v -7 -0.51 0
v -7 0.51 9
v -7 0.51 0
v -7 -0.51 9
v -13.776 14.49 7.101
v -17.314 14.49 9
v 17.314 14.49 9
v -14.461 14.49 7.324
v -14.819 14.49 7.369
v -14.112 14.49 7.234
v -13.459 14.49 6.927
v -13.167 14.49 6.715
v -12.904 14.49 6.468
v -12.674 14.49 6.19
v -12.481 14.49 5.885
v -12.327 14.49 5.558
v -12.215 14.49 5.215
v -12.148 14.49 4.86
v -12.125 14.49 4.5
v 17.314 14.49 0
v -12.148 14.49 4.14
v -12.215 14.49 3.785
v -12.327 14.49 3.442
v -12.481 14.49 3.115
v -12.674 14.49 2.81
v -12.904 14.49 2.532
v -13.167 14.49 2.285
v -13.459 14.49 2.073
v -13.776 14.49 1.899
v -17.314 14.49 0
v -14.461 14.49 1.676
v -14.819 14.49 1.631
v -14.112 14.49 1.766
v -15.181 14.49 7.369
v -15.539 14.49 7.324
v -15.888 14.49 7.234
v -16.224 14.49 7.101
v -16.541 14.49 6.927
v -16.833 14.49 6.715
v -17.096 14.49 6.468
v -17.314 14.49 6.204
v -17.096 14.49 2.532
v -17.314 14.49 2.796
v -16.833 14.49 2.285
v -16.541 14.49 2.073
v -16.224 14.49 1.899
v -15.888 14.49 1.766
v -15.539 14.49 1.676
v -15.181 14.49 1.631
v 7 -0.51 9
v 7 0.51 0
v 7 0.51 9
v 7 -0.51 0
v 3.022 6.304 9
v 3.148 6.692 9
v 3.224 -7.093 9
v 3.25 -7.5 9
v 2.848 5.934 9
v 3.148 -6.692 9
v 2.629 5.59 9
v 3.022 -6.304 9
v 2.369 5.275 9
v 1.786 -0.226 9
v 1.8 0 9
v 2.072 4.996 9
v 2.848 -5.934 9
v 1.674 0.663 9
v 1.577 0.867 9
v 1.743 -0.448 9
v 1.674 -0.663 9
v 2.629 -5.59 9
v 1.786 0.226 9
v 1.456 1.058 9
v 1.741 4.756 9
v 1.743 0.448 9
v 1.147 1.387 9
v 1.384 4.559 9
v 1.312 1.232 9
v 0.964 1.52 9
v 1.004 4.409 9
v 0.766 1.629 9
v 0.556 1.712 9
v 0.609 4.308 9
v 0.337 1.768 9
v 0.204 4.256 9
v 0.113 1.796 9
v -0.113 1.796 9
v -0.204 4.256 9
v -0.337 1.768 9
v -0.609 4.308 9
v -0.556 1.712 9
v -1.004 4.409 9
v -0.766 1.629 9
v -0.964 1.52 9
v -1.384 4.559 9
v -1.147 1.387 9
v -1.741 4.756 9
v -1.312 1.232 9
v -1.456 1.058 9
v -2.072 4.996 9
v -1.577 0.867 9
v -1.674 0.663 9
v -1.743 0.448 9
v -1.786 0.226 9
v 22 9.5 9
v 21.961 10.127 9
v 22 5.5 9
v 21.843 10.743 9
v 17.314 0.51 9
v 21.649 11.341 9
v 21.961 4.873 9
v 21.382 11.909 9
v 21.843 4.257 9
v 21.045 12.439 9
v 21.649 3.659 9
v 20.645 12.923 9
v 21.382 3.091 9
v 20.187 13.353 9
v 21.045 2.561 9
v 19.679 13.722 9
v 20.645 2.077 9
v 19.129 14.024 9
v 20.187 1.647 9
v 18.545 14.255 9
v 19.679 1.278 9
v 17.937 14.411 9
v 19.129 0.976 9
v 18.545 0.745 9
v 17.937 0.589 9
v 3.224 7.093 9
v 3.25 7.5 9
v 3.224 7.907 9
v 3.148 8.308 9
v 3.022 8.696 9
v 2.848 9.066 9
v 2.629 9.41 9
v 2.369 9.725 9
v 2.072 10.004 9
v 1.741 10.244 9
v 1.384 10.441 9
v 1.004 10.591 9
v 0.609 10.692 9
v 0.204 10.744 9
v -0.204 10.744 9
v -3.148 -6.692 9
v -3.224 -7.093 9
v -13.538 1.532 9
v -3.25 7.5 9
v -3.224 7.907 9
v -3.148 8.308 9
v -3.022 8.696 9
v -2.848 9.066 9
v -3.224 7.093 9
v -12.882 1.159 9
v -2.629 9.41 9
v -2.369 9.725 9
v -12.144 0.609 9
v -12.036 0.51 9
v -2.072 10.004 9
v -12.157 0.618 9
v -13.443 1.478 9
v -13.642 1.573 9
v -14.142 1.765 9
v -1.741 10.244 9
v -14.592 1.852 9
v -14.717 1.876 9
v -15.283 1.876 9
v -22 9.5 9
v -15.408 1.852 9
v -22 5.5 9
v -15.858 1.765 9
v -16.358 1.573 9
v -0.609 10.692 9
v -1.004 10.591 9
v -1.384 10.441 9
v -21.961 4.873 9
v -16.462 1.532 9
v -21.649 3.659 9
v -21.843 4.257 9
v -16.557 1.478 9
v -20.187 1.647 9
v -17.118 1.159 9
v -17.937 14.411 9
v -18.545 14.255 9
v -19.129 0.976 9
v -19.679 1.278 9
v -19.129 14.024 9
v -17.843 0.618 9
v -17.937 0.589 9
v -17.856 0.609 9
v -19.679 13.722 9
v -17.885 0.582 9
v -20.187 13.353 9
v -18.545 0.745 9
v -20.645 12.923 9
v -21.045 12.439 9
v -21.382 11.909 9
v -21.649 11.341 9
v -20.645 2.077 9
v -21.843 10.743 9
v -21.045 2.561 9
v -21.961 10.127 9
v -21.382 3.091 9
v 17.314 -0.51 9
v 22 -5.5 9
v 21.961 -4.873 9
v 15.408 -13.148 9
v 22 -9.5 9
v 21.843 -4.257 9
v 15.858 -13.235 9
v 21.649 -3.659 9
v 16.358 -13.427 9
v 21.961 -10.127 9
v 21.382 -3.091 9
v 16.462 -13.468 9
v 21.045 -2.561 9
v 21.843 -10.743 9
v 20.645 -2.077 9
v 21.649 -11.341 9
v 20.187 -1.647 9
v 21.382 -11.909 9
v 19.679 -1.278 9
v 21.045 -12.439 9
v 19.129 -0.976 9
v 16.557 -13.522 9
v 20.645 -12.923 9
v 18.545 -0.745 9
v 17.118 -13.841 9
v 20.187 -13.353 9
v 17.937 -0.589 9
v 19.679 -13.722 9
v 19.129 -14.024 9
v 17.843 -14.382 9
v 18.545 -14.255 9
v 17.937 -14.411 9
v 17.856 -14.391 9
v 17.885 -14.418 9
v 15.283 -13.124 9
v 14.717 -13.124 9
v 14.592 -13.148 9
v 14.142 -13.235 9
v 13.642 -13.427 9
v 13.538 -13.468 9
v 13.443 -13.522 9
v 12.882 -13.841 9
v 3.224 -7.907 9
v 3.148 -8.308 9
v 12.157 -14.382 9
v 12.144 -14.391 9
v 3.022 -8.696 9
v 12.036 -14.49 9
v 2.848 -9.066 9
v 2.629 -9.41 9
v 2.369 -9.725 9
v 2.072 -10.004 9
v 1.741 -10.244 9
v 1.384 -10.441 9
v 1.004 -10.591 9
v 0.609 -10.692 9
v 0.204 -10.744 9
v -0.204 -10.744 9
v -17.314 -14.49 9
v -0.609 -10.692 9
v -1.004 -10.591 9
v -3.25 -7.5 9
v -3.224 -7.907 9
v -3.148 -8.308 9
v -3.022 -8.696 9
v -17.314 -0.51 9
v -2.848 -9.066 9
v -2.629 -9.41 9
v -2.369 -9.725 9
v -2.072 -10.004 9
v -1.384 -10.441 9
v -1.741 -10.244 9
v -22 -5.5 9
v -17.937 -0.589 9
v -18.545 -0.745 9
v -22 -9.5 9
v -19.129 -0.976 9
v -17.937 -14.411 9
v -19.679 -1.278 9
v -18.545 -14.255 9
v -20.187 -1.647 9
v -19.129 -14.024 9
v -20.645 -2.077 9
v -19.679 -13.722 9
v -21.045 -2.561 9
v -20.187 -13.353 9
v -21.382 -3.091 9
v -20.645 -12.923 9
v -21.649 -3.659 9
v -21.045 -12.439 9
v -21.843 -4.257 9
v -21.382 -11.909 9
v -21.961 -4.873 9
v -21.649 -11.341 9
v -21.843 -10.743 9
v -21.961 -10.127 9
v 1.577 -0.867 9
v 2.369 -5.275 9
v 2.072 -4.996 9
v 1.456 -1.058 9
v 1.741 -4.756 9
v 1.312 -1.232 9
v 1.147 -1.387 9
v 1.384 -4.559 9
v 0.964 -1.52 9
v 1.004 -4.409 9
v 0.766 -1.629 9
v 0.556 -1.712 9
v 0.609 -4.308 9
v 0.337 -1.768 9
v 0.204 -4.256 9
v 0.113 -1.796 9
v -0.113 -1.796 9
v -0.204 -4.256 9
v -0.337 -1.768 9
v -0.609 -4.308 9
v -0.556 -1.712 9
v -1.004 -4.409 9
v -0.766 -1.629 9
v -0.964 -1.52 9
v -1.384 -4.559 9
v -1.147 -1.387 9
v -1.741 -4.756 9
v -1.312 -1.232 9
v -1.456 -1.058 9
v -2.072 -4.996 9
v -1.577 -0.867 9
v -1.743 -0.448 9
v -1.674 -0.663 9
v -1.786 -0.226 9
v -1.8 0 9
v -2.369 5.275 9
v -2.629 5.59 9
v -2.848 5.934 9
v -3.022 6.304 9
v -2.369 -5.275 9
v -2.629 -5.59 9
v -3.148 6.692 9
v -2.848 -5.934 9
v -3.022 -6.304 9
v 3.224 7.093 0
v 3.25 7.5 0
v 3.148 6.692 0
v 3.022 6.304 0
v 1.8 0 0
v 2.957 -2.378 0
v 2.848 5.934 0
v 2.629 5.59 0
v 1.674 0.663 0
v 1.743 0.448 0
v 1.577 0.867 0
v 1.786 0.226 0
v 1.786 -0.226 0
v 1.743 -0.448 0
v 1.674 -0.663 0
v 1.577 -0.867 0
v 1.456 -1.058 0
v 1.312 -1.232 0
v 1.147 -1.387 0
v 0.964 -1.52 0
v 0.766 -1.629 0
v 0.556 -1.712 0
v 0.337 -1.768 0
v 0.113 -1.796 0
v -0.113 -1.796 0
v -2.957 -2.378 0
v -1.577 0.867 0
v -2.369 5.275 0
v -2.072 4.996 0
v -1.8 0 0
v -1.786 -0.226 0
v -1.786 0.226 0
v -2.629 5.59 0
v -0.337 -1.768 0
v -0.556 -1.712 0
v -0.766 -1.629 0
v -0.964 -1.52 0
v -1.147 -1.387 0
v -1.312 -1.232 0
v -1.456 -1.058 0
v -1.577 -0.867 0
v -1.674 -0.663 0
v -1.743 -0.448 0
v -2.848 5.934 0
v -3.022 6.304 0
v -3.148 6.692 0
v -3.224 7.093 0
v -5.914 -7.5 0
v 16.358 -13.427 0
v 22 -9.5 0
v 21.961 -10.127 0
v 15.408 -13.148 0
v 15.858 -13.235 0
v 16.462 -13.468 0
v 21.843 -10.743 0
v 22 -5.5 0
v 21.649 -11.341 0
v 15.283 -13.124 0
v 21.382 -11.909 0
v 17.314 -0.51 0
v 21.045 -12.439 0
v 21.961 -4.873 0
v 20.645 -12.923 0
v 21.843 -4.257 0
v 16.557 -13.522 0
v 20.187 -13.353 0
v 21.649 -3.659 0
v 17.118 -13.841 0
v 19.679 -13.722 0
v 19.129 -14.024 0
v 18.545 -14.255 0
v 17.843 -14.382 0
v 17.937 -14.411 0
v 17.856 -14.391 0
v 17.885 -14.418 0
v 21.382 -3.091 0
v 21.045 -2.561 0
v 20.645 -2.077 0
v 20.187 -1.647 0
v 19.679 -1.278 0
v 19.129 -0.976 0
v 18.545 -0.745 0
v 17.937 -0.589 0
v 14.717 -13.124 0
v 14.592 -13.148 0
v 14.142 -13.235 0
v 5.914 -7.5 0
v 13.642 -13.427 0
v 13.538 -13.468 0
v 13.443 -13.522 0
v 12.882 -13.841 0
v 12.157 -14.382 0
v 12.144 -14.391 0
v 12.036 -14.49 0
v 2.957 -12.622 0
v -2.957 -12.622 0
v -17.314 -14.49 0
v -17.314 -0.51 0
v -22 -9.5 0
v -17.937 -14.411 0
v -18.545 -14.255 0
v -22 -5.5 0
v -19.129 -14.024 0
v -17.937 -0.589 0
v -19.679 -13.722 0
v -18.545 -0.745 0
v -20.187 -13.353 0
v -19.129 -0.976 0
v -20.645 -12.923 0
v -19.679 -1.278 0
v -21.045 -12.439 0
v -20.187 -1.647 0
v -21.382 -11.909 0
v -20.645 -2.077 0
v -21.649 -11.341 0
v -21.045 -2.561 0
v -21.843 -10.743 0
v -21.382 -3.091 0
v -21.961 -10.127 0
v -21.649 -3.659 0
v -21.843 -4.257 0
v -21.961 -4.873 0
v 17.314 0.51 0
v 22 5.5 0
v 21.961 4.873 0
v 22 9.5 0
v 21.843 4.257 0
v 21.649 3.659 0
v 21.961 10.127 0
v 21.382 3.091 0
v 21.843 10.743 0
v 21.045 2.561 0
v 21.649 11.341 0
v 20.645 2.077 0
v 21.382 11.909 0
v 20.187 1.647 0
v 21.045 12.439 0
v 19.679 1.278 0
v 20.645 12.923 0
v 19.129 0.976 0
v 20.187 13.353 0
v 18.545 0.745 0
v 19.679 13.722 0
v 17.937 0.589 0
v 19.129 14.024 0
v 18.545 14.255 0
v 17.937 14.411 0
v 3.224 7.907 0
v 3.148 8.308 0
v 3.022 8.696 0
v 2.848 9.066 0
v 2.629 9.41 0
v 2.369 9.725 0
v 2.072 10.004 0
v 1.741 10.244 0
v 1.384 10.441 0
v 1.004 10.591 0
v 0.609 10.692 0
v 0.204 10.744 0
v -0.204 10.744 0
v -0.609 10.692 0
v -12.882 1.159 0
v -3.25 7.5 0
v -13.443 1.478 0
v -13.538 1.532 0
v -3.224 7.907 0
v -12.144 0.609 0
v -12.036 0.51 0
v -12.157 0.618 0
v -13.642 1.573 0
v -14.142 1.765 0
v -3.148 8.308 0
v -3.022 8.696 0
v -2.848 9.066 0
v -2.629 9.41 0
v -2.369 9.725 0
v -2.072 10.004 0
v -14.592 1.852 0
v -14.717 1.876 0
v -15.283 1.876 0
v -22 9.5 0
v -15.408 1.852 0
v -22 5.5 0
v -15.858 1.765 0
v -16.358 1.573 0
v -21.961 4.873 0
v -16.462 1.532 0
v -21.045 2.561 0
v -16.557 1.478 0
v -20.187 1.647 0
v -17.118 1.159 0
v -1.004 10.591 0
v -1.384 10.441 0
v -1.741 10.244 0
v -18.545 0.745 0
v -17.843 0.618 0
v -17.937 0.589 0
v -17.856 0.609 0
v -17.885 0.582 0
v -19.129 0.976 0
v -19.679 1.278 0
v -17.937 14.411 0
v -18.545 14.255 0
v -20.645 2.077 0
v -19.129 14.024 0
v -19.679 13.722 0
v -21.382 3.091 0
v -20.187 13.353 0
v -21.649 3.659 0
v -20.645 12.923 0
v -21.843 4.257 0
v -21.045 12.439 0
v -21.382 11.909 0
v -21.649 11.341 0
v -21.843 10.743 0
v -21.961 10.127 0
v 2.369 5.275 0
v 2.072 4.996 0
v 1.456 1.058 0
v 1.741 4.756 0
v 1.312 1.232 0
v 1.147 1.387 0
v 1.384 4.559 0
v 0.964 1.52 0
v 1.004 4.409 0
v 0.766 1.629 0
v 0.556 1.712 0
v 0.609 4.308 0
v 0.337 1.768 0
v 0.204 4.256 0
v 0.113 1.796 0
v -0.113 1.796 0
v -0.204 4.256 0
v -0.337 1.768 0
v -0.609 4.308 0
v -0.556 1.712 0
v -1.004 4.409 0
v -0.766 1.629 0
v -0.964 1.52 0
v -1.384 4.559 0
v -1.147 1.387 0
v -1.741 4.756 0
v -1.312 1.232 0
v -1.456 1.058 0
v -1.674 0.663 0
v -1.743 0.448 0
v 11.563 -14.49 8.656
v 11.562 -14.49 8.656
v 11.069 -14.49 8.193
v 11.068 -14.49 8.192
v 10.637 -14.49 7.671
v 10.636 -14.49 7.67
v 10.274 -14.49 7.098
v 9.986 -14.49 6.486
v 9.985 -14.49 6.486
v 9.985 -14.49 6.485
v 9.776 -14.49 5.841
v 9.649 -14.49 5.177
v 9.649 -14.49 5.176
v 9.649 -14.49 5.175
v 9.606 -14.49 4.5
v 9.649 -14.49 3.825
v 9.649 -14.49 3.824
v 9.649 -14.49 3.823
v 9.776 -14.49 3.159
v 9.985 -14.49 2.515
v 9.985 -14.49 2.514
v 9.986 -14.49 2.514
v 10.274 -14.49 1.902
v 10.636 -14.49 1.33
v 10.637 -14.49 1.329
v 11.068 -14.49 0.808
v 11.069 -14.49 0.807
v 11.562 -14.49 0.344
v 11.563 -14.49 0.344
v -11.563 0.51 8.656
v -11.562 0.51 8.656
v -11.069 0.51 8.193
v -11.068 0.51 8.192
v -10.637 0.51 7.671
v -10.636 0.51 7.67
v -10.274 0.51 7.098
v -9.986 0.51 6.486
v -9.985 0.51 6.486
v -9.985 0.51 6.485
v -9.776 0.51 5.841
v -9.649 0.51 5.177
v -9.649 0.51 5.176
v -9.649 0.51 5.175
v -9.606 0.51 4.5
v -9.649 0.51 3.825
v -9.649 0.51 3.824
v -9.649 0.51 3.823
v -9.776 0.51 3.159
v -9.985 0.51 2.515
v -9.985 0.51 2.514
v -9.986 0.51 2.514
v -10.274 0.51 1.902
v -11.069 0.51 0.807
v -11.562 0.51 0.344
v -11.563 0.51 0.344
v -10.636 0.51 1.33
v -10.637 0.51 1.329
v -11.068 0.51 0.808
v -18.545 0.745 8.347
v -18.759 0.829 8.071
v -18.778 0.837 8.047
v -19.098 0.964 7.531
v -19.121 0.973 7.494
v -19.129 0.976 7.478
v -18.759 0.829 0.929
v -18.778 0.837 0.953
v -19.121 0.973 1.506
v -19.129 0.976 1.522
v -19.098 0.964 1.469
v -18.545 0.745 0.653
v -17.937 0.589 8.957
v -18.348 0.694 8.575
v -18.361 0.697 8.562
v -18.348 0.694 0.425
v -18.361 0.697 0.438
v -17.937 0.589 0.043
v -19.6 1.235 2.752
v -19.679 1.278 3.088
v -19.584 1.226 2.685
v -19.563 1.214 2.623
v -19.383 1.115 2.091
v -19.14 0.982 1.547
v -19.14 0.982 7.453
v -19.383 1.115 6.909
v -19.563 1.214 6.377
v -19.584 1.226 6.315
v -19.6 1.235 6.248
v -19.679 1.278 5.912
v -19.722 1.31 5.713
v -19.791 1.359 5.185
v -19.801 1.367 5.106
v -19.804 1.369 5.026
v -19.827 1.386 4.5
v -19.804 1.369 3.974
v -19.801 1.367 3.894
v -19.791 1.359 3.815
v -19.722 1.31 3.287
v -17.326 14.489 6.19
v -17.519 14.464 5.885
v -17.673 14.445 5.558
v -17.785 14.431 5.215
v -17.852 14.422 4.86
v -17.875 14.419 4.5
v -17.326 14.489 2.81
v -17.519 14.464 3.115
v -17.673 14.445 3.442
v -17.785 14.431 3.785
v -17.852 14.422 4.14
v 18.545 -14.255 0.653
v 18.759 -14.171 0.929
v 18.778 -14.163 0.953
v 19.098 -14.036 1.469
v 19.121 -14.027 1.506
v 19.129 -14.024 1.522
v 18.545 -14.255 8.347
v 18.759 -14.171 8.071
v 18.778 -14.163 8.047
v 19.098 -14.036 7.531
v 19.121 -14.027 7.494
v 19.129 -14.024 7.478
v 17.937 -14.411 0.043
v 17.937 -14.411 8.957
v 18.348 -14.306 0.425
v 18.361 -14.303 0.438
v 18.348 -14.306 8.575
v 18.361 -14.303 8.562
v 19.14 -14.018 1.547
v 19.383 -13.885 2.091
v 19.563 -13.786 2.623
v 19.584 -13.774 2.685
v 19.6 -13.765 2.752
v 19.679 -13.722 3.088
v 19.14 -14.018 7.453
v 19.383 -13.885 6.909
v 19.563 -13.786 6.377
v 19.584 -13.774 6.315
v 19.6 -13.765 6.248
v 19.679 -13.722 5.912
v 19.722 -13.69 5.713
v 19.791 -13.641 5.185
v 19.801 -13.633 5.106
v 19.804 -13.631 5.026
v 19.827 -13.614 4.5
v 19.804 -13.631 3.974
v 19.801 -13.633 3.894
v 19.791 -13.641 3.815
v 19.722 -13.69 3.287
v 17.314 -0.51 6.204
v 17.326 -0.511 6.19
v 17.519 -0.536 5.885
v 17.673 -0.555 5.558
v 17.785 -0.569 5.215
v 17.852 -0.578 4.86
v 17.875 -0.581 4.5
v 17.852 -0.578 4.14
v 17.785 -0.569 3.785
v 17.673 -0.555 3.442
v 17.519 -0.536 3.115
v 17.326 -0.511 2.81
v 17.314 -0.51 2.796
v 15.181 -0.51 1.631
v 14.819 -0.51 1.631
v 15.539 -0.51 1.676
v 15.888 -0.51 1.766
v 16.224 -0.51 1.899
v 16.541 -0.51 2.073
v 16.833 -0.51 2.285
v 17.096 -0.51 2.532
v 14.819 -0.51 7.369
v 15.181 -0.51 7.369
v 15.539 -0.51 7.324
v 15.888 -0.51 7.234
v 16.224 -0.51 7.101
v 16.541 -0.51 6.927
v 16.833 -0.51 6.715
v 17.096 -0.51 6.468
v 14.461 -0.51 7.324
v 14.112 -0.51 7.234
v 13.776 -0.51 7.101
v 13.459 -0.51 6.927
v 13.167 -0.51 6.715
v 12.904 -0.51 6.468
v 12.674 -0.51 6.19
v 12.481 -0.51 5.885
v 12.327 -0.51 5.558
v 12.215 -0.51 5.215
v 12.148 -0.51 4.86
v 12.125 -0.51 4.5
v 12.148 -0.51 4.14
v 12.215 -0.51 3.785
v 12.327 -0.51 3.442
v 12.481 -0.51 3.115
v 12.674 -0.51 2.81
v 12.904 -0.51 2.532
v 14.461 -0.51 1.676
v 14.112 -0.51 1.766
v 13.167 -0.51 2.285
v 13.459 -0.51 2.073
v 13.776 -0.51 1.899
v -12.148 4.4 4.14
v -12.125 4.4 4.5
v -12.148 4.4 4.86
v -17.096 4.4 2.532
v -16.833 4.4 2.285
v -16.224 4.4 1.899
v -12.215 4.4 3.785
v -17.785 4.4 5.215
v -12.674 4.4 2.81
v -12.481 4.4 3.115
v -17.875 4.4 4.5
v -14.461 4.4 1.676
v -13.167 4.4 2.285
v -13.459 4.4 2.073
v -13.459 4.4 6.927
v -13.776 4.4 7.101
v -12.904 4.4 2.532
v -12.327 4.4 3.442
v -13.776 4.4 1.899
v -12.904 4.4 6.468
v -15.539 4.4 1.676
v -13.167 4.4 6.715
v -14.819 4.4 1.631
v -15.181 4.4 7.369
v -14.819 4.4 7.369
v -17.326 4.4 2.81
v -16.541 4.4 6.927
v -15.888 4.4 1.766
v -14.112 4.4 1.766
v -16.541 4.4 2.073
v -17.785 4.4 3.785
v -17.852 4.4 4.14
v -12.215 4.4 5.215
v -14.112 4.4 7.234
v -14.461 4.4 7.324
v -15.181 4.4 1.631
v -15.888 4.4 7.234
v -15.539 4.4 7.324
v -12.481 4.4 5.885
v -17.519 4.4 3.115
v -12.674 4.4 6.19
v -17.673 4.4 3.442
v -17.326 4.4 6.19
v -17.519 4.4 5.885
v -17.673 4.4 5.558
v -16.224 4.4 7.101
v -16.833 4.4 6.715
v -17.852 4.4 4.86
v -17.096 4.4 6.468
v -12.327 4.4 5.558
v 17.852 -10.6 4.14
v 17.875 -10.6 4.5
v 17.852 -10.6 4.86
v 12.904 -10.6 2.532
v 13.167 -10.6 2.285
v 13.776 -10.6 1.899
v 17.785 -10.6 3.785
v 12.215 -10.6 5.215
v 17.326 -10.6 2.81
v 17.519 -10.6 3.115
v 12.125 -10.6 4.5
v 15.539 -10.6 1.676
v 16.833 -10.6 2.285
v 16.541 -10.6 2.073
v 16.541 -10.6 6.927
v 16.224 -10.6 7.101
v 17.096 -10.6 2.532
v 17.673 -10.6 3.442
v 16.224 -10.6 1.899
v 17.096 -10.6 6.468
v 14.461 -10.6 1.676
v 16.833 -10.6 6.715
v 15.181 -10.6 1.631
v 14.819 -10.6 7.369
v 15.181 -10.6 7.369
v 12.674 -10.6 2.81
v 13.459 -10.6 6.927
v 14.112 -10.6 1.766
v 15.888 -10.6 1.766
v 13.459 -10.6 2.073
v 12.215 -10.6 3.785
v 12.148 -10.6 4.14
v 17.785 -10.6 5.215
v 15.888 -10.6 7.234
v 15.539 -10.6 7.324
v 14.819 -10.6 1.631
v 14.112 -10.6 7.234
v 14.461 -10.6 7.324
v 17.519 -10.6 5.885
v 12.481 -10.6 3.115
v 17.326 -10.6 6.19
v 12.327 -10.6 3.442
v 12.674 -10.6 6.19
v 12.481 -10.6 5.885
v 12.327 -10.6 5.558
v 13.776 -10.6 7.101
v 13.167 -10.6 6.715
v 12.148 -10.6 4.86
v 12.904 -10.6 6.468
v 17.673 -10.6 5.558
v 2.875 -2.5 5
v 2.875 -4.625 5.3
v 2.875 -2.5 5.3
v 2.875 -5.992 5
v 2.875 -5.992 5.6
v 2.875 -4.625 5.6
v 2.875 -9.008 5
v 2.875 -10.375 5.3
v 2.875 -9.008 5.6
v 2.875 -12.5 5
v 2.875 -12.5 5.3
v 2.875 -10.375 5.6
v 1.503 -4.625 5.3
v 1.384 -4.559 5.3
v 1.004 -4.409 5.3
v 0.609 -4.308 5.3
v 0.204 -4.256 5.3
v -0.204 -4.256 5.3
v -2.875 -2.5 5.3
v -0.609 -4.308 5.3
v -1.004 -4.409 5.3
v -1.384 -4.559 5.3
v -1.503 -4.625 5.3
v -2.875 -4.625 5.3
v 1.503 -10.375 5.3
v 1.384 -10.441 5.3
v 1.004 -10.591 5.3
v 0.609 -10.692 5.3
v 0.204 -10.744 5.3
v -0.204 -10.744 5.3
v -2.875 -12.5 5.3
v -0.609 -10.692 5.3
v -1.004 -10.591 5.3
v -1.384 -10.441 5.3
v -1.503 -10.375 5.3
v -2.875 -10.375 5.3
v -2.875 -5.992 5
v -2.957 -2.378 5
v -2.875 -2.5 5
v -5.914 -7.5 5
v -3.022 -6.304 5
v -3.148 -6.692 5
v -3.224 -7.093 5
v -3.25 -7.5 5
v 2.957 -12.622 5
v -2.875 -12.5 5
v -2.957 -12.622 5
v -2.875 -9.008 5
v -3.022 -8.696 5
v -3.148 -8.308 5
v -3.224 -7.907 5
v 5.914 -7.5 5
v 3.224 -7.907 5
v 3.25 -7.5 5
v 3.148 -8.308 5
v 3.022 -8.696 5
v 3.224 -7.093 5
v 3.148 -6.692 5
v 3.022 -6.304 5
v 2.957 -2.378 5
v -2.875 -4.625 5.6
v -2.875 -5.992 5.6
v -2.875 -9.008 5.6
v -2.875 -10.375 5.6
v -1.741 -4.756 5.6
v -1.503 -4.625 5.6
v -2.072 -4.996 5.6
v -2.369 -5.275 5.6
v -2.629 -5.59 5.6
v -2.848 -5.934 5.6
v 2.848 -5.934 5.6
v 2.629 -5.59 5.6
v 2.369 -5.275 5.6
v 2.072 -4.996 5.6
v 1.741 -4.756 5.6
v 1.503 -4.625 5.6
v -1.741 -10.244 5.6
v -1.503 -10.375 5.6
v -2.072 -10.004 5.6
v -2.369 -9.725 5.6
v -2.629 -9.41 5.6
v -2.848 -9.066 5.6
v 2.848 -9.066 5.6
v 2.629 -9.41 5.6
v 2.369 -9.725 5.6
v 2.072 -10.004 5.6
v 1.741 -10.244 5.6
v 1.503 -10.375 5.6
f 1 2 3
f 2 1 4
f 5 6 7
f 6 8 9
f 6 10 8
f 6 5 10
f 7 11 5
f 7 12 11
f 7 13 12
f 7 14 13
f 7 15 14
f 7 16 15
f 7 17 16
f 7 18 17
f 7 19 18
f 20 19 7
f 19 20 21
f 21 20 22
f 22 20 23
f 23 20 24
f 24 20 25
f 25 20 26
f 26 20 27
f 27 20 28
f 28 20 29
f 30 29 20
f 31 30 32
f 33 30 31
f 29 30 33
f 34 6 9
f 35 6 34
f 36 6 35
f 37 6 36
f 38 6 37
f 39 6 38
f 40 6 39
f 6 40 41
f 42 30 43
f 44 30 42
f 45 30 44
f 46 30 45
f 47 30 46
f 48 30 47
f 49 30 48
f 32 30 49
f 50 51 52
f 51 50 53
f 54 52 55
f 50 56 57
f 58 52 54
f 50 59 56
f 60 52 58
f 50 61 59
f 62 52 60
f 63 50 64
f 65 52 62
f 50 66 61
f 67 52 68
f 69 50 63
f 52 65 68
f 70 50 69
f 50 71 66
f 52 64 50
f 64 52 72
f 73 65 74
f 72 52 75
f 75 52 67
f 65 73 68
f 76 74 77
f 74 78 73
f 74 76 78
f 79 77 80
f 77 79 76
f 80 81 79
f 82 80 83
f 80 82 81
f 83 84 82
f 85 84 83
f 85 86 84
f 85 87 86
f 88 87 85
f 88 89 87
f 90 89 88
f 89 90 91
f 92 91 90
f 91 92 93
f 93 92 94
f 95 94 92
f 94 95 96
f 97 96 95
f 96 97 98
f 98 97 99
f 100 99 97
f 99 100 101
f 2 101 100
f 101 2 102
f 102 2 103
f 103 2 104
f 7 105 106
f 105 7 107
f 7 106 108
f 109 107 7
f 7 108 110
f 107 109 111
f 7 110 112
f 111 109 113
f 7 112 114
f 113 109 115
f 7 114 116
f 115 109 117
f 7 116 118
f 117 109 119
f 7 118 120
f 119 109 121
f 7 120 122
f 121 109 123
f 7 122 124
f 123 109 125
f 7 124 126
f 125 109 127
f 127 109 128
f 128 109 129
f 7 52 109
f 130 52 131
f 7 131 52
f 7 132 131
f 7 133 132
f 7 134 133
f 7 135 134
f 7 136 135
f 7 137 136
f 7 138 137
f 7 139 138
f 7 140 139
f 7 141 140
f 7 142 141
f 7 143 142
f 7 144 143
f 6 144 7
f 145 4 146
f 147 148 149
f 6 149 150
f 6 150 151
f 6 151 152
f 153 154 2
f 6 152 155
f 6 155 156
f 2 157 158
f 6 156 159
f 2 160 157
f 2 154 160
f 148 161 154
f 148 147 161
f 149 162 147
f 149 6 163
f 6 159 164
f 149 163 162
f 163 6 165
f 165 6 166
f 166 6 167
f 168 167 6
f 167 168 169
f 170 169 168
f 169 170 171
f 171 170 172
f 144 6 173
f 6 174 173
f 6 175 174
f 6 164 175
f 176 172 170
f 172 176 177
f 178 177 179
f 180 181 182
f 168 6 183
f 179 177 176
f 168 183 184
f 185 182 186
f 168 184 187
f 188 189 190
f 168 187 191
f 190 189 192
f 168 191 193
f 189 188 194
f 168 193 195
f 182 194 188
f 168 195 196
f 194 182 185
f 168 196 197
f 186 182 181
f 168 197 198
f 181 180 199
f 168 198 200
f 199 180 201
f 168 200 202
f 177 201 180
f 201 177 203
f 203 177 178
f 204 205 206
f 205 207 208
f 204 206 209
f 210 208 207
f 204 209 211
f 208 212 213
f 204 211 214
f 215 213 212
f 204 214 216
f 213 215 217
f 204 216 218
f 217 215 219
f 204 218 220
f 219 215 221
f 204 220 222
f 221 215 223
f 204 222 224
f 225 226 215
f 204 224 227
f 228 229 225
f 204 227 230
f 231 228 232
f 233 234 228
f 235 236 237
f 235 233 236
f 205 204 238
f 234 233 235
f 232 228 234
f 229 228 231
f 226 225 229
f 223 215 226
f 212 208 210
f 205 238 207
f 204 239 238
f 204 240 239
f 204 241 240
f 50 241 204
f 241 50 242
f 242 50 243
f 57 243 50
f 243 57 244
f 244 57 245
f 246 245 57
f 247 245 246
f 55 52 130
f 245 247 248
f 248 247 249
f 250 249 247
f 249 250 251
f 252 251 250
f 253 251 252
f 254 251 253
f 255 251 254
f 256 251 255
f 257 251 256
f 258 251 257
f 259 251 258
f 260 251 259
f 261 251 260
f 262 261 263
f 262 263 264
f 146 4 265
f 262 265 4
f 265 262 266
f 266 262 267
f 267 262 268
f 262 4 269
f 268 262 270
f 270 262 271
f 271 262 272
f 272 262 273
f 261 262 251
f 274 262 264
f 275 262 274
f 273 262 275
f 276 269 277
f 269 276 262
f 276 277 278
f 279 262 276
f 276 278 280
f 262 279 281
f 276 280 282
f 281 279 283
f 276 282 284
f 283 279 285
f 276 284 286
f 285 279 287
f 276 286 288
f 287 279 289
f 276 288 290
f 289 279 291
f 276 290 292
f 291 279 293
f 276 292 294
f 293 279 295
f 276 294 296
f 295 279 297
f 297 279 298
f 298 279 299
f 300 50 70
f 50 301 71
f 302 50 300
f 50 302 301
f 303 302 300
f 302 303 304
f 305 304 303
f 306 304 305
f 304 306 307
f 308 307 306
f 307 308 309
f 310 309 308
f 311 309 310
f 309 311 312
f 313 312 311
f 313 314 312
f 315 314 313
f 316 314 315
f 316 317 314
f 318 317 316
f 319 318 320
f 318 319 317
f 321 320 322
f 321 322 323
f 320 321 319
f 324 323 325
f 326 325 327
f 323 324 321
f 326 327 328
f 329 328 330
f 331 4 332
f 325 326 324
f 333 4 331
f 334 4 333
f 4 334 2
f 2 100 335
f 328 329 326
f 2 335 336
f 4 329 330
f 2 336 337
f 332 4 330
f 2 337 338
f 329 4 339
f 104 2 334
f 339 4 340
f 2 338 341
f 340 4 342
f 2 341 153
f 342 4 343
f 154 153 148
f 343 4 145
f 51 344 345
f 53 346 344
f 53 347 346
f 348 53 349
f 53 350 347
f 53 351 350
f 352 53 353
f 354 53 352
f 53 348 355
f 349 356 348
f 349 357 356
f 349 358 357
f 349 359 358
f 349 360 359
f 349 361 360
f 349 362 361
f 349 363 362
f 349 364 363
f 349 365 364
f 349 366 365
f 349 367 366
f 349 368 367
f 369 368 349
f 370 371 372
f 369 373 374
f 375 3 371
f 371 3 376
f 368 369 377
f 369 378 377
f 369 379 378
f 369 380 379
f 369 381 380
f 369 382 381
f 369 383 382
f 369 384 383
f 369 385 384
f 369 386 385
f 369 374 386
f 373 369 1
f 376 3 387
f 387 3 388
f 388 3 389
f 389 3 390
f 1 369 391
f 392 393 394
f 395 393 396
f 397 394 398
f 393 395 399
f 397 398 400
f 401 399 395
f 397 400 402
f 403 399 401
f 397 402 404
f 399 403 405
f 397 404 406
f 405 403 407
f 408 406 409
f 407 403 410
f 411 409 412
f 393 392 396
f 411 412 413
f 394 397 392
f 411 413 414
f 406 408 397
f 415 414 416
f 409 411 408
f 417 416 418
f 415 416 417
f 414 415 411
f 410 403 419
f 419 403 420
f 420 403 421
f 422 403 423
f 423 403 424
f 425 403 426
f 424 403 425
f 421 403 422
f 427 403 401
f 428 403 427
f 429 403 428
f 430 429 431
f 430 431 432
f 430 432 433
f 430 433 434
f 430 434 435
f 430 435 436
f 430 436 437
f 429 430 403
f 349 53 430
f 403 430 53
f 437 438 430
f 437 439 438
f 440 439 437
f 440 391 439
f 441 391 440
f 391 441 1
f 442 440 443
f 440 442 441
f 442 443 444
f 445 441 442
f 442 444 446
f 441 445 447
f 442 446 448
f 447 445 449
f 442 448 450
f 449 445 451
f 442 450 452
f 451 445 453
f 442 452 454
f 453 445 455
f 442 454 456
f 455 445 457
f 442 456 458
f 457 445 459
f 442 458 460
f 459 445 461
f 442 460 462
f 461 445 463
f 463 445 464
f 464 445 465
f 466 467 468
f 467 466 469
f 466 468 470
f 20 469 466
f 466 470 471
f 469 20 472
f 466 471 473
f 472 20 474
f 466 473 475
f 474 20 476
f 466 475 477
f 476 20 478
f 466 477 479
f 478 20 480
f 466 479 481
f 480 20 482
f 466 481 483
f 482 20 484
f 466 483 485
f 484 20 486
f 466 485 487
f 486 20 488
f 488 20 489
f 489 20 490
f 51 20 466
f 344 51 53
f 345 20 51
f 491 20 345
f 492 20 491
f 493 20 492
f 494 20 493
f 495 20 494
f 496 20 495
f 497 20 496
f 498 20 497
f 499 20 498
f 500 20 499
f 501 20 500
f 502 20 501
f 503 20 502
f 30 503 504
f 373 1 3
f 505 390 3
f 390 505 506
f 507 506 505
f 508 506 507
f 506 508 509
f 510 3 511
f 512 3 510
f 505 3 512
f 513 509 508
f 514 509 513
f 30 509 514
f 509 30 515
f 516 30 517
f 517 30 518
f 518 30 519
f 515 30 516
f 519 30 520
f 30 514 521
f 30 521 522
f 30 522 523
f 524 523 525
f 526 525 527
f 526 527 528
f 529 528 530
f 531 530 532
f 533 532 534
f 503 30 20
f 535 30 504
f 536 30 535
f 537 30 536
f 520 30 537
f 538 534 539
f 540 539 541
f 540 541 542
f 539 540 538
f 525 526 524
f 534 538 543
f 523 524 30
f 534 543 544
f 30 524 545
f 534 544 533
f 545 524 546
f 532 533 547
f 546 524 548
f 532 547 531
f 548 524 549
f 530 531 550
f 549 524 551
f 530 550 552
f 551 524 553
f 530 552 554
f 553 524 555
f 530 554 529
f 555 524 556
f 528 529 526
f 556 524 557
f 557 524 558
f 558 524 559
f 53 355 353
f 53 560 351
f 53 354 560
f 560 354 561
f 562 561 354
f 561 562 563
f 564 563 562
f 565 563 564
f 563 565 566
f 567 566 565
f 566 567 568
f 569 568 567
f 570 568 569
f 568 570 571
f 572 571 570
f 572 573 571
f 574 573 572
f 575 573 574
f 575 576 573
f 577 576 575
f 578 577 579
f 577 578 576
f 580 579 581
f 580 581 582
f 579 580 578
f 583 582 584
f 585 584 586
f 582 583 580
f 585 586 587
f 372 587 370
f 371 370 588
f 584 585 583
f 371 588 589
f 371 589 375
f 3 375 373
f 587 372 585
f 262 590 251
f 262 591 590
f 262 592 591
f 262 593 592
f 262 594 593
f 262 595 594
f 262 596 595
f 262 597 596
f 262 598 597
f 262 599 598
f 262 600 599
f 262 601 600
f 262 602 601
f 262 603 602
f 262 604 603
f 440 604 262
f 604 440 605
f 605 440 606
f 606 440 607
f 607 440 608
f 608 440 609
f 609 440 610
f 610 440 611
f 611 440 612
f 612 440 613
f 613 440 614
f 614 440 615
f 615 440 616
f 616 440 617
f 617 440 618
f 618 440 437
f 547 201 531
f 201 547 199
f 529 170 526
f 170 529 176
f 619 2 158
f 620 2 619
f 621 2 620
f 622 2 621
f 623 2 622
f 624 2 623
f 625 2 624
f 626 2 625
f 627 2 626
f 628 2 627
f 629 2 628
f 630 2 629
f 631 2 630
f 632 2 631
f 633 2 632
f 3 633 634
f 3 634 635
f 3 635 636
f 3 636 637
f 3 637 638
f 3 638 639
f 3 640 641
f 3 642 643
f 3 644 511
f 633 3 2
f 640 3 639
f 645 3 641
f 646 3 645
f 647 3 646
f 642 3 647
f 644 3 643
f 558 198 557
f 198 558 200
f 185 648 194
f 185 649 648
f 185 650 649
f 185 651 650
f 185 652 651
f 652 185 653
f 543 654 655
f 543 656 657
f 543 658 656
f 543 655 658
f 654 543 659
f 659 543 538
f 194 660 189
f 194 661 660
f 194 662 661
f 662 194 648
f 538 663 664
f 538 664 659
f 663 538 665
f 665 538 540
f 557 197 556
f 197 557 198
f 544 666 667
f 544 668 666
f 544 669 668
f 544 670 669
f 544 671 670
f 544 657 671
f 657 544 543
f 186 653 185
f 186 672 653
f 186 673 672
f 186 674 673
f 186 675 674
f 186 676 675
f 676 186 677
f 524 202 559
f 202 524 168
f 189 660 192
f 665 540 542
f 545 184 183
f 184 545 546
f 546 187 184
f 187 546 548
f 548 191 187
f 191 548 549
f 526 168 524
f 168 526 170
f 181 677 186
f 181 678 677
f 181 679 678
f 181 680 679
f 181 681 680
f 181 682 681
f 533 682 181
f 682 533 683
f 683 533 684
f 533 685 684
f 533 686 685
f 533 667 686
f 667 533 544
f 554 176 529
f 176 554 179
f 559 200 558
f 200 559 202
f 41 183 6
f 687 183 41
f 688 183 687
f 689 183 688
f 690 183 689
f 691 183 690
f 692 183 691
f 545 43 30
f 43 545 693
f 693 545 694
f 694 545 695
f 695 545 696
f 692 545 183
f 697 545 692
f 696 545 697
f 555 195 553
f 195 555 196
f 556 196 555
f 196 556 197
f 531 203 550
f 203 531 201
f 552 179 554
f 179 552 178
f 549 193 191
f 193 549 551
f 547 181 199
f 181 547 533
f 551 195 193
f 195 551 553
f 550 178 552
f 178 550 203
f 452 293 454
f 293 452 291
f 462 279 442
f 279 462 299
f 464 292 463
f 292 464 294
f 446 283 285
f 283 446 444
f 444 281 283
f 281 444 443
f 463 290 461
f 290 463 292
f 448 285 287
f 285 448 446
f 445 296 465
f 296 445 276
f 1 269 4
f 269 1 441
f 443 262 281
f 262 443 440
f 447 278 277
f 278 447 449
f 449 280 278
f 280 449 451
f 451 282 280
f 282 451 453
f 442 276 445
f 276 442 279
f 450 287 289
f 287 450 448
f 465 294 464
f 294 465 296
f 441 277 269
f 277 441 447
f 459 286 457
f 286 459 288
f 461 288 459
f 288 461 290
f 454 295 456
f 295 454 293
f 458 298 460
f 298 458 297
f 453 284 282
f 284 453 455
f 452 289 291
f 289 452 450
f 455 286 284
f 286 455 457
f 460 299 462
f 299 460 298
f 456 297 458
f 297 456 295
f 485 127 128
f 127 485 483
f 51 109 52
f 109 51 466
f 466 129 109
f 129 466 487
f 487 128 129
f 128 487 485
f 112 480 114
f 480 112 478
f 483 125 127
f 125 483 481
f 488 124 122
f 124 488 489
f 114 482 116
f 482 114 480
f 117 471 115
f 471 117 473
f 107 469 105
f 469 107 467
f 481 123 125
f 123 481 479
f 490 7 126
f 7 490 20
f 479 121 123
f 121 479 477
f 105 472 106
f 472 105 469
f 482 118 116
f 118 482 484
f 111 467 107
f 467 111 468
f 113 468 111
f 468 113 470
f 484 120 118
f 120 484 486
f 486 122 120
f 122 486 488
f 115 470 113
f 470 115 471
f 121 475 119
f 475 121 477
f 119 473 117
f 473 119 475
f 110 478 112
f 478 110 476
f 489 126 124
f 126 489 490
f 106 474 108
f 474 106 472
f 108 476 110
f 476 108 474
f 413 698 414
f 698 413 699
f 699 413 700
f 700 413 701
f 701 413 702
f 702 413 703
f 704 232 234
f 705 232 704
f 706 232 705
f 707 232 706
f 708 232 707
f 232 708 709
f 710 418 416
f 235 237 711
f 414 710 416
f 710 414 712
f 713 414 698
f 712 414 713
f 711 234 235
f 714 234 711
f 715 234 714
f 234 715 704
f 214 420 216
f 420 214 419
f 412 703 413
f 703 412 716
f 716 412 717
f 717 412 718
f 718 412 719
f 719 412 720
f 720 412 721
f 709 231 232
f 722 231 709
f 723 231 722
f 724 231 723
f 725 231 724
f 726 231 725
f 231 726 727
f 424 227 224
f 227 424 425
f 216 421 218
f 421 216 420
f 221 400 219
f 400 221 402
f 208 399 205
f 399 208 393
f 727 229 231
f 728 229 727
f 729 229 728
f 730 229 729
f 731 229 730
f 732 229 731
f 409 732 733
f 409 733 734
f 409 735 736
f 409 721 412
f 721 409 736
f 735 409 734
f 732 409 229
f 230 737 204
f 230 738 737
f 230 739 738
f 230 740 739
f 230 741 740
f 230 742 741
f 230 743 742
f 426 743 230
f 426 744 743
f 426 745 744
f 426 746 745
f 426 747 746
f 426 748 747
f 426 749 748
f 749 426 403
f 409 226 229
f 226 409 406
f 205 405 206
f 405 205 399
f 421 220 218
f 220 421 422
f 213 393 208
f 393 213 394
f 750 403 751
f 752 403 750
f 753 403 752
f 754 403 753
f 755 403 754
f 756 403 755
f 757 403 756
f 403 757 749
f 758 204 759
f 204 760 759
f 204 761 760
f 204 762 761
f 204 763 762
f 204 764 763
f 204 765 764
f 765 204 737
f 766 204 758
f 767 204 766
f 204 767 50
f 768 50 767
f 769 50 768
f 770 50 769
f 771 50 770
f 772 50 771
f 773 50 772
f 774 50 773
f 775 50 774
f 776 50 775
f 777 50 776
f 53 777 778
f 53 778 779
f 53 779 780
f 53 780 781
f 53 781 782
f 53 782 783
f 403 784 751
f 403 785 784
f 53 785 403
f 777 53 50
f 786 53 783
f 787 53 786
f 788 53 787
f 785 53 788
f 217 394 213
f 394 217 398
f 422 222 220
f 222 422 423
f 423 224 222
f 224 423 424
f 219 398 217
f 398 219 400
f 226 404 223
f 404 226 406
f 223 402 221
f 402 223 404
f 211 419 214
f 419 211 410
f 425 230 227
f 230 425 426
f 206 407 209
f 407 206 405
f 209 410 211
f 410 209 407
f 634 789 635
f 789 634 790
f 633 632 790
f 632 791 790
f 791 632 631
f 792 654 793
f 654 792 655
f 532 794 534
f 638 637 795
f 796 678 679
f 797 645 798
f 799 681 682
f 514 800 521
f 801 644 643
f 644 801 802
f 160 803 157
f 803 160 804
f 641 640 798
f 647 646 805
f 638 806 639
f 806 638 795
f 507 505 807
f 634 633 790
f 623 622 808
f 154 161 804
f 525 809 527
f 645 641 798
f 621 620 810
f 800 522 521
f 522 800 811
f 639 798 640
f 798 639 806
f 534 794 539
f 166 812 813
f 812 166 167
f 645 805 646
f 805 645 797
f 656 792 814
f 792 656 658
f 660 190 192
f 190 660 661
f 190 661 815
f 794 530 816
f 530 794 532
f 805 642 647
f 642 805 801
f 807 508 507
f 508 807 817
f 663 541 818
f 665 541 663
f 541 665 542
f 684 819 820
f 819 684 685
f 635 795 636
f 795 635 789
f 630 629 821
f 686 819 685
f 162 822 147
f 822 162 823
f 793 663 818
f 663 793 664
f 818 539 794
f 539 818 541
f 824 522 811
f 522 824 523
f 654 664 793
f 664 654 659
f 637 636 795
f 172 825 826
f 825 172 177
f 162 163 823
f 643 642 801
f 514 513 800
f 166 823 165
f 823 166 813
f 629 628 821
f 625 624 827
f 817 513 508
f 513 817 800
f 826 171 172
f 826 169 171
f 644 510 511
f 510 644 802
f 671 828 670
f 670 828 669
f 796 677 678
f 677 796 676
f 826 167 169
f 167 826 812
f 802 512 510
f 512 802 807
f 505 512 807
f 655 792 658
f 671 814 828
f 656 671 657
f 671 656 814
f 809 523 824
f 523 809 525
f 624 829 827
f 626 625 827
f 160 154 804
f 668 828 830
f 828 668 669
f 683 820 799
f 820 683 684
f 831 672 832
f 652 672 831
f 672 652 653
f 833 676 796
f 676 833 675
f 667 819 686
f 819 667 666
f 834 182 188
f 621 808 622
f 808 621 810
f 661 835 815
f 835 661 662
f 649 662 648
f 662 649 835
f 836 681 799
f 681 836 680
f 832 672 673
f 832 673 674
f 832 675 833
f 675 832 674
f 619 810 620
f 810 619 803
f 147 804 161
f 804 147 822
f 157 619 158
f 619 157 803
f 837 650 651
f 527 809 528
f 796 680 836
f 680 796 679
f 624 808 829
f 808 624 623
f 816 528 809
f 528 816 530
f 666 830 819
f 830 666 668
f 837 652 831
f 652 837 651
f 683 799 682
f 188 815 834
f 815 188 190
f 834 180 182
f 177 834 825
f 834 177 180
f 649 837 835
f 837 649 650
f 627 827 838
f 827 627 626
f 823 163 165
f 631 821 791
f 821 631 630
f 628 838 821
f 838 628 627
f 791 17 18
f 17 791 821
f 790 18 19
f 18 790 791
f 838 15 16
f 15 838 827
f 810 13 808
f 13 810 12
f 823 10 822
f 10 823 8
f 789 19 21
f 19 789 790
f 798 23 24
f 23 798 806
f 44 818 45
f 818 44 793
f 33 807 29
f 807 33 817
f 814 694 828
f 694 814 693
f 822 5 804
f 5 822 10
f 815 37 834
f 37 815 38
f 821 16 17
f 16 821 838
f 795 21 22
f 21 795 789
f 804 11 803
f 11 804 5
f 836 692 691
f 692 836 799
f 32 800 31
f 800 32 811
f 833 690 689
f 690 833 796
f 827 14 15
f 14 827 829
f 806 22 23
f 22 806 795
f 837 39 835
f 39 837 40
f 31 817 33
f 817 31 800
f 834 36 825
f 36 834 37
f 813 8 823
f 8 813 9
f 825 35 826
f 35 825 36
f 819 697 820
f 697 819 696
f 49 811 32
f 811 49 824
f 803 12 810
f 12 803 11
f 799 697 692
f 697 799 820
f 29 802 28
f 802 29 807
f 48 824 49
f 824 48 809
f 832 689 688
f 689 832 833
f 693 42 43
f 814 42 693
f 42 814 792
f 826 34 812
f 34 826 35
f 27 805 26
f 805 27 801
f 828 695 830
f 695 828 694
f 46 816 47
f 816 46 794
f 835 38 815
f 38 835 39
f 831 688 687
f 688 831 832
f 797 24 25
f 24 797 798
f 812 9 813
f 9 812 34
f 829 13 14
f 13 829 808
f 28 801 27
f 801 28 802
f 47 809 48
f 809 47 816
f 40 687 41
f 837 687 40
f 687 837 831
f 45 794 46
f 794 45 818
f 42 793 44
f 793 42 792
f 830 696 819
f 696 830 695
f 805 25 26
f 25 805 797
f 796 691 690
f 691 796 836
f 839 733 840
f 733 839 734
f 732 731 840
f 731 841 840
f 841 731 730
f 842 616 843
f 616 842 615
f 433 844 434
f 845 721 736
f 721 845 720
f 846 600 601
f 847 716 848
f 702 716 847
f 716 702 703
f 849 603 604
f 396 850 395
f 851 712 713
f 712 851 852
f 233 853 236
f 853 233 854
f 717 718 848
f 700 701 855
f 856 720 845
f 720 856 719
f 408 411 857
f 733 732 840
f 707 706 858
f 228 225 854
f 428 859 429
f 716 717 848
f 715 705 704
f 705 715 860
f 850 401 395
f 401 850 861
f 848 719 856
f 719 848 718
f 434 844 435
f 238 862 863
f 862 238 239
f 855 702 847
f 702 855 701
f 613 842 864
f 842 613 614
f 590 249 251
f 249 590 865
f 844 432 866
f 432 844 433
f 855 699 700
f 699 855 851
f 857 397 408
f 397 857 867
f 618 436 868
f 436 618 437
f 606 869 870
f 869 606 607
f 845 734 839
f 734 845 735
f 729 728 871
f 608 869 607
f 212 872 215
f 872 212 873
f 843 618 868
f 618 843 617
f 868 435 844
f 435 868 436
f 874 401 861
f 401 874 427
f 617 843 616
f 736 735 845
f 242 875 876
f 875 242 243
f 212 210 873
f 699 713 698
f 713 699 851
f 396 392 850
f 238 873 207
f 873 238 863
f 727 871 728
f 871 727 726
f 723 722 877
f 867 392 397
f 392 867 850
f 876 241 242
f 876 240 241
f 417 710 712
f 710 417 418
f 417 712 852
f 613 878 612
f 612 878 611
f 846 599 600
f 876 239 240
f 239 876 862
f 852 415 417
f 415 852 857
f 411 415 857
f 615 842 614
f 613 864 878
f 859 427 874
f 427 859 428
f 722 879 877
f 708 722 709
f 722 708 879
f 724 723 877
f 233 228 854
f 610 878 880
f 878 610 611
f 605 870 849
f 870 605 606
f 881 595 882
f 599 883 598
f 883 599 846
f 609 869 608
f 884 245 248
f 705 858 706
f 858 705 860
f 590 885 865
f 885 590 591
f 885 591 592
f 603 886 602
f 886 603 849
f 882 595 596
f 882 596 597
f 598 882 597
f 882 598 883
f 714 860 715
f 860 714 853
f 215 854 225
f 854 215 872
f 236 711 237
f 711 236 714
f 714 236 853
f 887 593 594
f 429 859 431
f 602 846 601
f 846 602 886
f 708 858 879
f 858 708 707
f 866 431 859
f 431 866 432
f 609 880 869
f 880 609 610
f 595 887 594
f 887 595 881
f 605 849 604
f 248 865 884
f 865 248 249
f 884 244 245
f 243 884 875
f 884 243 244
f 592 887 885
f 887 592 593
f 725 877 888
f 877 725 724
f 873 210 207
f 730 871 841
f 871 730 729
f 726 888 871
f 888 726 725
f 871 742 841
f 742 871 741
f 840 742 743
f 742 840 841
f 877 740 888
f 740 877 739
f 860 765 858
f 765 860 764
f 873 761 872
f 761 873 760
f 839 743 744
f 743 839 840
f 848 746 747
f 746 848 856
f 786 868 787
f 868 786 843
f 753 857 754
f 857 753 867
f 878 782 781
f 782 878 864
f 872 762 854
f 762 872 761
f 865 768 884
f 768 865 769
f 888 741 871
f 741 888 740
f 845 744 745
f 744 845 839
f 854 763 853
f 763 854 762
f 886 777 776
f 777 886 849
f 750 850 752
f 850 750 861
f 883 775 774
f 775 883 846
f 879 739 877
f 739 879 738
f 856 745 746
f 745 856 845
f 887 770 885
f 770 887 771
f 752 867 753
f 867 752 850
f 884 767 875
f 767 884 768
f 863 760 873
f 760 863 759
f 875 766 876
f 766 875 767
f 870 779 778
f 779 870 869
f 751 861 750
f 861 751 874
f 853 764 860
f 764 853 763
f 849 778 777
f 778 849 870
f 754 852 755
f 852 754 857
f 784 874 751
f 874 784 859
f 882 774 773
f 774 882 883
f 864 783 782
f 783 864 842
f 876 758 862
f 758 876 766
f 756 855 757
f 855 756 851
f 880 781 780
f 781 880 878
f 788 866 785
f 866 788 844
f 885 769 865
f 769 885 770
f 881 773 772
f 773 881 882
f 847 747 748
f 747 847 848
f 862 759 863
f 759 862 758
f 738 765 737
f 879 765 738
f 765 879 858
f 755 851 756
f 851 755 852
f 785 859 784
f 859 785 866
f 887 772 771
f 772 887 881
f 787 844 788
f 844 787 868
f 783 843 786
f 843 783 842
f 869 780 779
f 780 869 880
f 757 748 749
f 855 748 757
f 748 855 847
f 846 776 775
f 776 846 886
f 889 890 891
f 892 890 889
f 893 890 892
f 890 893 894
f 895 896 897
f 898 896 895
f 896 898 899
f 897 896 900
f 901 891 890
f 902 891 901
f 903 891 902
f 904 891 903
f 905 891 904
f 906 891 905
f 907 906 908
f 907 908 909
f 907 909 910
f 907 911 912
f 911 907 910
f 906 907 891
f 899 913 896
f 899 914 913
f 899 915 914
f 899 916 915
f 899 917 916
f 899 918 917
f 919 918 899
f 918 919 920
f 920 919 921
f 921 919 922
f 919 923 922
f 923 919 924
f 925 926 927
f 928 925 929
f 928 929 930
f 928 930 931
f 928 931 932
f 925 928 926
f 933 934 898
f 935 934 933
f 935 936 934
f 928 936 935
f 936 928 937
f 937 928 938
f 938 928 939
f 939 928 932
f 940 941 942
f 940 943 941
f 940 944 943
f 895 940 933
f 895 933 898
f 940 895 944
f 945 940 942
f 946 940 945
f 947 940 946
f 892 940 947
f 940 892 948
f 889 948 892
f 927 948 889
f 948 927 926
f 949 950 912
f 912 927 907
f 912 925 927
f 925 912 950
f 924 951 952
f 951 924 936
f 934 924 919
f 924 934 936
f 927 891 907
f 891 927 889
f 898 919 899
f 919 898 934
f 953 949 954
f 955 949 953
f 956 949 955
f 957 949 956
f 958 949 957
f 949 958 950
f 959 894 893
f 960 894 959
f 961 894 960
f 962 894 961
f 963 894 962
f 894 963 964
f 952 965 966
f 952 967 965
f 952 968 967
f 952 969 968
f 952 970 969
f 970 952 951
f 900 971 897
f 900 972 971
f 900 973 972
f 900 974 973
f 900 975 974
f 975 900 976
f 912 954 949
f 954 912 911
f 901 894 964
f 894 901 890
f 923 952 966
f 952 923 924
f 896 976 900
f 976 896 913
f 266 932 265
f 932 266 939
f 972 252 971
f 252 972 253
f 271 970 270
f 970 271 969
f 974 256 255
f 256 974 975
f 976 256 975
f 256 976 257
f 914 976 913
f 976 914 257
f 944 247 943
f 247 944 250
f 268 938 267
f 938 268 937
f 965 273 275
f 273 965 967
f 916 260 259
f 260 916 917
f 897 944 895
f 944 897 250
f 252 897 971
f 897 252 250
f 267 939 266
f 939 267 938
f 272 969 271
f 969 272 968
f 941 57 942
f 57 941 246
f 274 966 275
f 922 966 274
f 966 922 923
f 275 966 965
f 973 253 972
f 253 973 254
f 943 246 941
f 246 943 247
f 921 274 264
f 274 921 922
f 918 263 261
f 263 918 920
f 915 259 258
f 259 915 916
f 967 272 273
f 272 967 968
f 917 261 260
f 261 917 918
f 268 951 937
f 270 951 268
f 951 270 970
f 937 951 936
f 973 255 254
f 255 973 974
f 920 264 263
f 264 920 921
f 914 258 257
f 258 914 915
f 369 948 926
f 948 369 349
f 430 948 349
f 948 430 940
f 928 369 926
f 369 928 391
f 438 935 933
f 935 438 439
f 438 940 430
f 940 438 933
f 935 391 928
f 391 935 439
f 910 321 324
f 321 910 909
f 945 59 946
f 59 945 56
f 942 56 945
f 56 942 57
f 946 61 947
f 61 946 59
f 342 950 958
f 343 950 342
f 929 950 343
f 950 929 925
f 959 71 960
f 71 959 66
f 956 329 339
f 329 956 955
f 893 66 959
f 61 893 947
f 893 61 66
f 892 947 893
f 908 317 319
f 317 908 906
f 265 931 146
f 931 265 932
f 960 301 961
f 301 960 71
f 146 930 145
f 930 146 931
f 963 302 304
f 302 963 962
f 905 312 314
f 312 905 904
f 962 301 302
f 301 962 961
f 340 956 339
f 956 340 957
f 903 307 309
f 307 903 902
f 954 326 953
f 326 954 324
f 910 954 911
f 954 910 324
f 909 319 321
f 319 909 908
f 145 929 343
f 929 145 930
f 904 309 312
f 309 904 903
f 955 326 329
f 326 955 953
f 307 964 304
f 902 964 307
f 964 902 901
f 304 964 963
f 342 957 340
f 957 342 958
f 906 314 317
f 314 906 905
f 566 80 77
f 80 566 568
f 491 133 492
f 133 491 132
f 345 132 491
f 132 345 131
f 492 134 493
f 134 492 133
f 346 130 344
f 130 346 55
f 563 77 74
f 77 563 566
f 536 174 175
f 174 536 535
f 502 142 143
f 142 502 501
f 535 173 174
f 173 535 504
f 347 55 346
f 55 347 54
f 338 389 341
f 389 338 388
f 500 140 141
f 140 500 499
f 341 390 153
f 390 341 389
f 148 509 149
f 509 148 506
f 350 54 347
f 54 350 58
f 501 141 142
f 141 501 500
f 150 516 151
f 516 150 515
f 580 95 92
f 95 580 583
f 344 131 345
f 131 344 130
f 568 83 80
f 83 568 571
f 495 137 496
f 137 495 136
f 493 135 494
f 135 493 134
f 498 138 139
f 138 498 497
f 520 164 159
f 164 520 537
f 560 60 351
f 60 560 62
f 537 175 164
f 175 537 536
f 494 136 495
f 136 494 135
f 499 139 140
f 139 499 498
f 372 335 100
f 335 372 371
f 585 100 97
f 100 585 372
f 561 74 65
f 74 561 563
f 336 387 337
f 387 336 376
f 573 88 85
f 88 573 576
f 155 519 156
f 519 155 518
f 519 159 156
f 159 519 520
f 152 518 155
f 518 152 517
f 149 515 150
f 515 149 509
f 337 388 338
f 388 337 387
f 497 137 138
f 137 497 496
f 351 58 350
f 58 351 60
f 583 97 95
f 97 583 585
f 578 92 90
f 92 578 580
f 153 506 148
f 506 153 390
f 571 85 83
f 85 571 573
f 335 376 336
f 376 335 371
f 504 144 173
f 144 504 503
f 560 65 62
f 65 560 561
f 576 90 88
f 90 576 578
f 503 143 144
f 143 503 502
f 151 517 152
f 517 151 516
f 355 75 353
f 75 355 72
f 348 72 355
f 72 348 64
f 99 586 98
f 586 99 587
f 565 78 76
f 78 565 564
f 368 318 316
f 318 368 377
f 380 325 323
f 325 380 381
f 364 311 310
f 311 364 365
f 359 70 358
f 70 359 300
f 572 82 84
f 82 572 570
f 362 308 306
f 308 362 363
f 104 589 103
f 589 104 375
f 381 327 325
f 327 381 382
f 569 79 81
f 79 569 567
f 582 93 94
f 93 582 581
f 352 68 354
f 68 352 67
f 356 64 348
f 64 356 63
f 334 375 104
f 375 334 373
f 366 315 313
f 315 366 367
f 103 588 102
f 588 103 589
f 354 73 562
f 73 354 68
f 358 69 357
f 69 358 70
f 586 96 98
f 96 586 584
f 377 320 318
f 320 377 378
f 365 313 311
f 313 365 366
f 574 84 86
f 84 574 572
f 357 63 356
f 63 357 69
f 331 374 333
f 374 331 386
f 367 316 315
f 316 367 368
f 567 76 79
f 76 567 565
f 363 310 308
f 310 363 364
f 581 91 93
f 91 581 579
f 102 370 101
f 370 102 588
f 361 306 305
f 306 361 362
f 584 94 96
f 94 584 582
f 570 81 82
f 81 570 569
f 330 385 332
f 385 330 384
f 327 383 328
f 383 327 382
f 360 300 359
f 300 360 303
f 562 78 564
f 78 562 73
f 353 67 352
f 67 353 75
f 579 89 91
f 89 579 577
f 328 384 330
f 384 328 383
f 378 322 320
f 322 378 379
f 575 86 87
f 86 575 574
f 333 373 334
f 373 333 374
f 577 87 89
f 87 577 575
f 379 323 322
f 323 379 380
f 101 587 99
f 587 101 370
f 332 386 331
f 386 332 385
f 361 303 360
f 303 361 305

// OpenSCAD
$fn = 50;


difference() {
	union() {
		hull() {
			translate(v = [-2.0000000000, 9.5000000000, 0]) {
				cylinder(h = 9, r = 5);
			}
			translate(v = [2.0000000000, 9.5000000000, 0]) {
				cylinder(h = 9, r = 5);
			}
			translate(v = [-2.0000000000, -9.5000000000, 0]) {
				cylinder(h = 9, r = 5);
			}
			translate(v = [2.0000000000, -9.5000000000, 0]) {
				cylinder(h = 9, r = 5);
			}
		}
		translate(v = [-7.5000000000, 7.5000000000, 0]) {
			hull() {
				translate(v = [-9.5000000000, 2.0000000000, 0]) {
					cylinder(h = 9, r = 5);
				}
				translate(v = [9.5000000000, 2.0000000000, 0]) {
					cylinder(h = 9, r = 5);
				}
				translate(v = [-9.5000000000, -2.0000000000, 0]) {
					cylinder(h = 9, r = 5);
				}
				translate(v = [9.5000000000, -2.0000000000, 0]) {
					cylinder(h = 9, r = 5);
				}
			}
		}
		translate(v = [-7.5000000000, -7.5000000000, 0]) {
			hull() {
				translate(v = [-9.5000000000, 2.0000000000, 0]) {
					cylinder(h = 9, r = 5);
				}
				translate(v = [9.5000000000, 2.0000000000, 0]) {
					cylinder(h = 9, r = 5);
				}
				translate(v = [-9.5000000000, -2.0000000000, 0]) {
					cylinder(h = 9, r = 5);
				}
				translate(v = [9.5000000000, -2.0000000000, 0]) {
					cylinder(h = 9, r = 5);
				}
			}
		}
		translate(v = [7.5000000000, 7.5000000000, 0]) {
			hull() {
				translate(v = [-9.5000000000, 2.0000000000, 0]) {
					cylinder(h = 9, r = 5);
				}
				translate(v = [9.5000000000, 2.0000000000, 0]) {
					cylinder(h = 9, r = 5);
				}
				translate(v = [-9.5000000000, -2.0000000000, 0]) {
					cylinder(h = 9, r = 5);
				}
				translate(v = [9.5000000000, -2.0000000000, 0]) {
					cylinder(h = 9, r = 5);
				}
			}
		}
		translate(v = [7.5000000000, -7.5000000000, 0]) {
			hull() {
				translate(v = [-9.5000000000, 2.0000000000, 0]) {
					cylinder(h = 9, r = 5);
				}
				translate(v = [9.5000000000, 2.0000000000, 0]) {
					cylinder(h = 9, r = 5);
				}
				translate(v = [-9.5000000000, -2.0000000000, 0]) {
					cylinder(h = 9, r = 5);
				}
				translate(v = [9.5000000000, -2.0000000000, 0]) {
					cylinder(h = 9, r = 5);
				}
			}
		}
	}
	union() {
		translate(v = [-15.0000000000, 0.5000000000, 4.5000000000]) {
			rotate(a = [90, 0, 0]) {
				difference() {
					union() {
						#translate(v = [0, 0, -14.0000000000]) {
							cylinder(h = 14, r = 2.6000000000);
						}
						#translate(v = [0, 0, -3.9000000000]) {
							cylinder(h = 3.9000000000, r1 = 2.8750000000, r2 = 5.4000000000);
						}
						#translate(v = [0, 0, -14.0000000000]) {
							cylinder(h = 14, r = 2.8750000000);
						}
						#translate(v = [0, 0, -14.0000000000]) {
							cylinder(h = 14, r = 2.6000000000);
						}
					}
					union();
				}
			}
		}
		translate(v = [15.0000000000, -14.5000000000, 4.5000000000]) {
			rotate(a = [90, 0, 0]) {
				difference() {
					union() {
						#translate(v = [0, 0, -14.0000000000]) {
							cylinder(h = 14, r = 2.6000000000);
						}
						#translate(v = [0, 0, -3.9000000000]) {
							cylinder(h = 3.9000000000, r1 = 2.8750000000, r2 = 5.4000000000);
						}
						#translate(v = [0, 0, -14.0000000000]) {
							cylinder(h = 14, r = 2.8750000000);
						}
						#translate(v = [0, 0, -14.0000000000]) {
							cylinder(h = 14, r = 2.6000000000);
						}
					}
					union();
				}
			}
		}
		translate(v = [0.0000000000, -7.5000000000, 0]) {
			rotate(a = [0, 0, 0]) {
				difference() {
					union() {
						#translate(v = [-2.8750000000, -5.0000000000, -0.3000000000]) {
							cube(size = [5.7500000000, 10, 0.3000000000]);
						}
						#translate(v = [-2.8750000000, -2.8750000000, -0.6000000000]) {
							cube(size = [5.7500000000, 5.7500000000, 0.3000000000]);
						}
						#translate(v = [-2.8750000000, -5.0000000000, 5]) {
							cube(size = [5.7500000000, 10, 0.3000000000]);
						}
						#translate(v = [-2.8750000000, -2.8750000000, 5.3000000000]) {
							cube(size = [5.7500000000, 5.7500000000, 0.3000000000]);
						}
						#translate(v = [0, 0, -100.0000000000]) {
							cylinder(h = 200, r = 3.2500000000);
						}
						#linear_extrude(height = 5) {
							polygon(points = [[5.9142500000, 0.0000000000], [2.9571250000, 5.1218907443], [-2.9571250000, 5.1218907443], [-5.9142500000, 0.0000000000], [-2.9571250000, -5.1218907443], [2.9571250000, -5.1218907443]]);
						}
						#translate(v = [-2.8750000000, -5.0000000000, -0.3000000000]) {
							cube(size = [5.7500000000, 10, 0.3000000000]);
						}
						#translate(v = [-2.8750000000, -2.8750000000, -0.6000000000]) {
							cube(size = [5.7500000000, 5.7500000000, 0.3000000000]);
						}
						#translate(v = [-2.8750000000, -5.0000000000, 5]) {
							cube(size = [5.7500000000, 10, 0.3000000000]);
						}
						#translate(v = [-2.8750000000, -2.8750000000, 5.3000000000]) {
							cube(size = [5.7500000000, 5.7500000000, 0.3000000000]);
						}
						#translate(v = [0, 0, -100.0000000000]) {
							cylinder(h = 200, r = 3.2500000000);
						}
						#translate(v = [-2.8750000000, -5.0000000000, -0.3000000000]) {
							cube(size = [5.7500000000, 10, 0.3000000000]);
						}
						#translate(v = [-2.8750000000, -2.8750000000, -0.6000000000]) {
							cube(size = [5.7500000000, 5.7500000000, 0.3000000000]);
						}
						#translate(v = [-2.8750000000, -5.0000000000, 5]) {
							cube(size = [5.7500000000, 10, 0.3000000000]);
						}
						#translate(v = [-2.8750000000, -2.8750000000, 5.3000000000]) {
							cube(size = [5.7500000000, 5.7500000000, 0.3000000000]);
						}
						#translate(v = [0, 0, -100.0000000000]) {
							cylinder(h = 200, r = 3.2500000000);
						}
					}
					union();
				}
			}
		}
		translate(v = [0.0000000000, -7.5000000000, 0]) {
			translate(v = [0, 0, -100]) {
				cylinder(h = 200, r = 3.2500000000);
			}
		}
		translate(v = [0.0000000000, 7.5000000000, 0]) {
			translate(v = [0, 0, -100]) {
				cylinder(h = 200, r = 3.2500000000);
			}
		}
		translate(v = [0.0000000000, -7.5000000000, 0]) {
			translate(v = [0, 0, -100]) {
				cylinder(h = 200, r = 1.8000000000);
			}
		}
		translate(v = [0, 0, -100]) {
			cylinder(h = 200, r = 1.8000000000);
		}
		translate(v = [0.0000000000, 7.5000000000, 0]) {
			translate(v = [0, 0, -100]) {
				cylinder(h = 200, r = 1.8000000000);
			}
		}
	}
}
